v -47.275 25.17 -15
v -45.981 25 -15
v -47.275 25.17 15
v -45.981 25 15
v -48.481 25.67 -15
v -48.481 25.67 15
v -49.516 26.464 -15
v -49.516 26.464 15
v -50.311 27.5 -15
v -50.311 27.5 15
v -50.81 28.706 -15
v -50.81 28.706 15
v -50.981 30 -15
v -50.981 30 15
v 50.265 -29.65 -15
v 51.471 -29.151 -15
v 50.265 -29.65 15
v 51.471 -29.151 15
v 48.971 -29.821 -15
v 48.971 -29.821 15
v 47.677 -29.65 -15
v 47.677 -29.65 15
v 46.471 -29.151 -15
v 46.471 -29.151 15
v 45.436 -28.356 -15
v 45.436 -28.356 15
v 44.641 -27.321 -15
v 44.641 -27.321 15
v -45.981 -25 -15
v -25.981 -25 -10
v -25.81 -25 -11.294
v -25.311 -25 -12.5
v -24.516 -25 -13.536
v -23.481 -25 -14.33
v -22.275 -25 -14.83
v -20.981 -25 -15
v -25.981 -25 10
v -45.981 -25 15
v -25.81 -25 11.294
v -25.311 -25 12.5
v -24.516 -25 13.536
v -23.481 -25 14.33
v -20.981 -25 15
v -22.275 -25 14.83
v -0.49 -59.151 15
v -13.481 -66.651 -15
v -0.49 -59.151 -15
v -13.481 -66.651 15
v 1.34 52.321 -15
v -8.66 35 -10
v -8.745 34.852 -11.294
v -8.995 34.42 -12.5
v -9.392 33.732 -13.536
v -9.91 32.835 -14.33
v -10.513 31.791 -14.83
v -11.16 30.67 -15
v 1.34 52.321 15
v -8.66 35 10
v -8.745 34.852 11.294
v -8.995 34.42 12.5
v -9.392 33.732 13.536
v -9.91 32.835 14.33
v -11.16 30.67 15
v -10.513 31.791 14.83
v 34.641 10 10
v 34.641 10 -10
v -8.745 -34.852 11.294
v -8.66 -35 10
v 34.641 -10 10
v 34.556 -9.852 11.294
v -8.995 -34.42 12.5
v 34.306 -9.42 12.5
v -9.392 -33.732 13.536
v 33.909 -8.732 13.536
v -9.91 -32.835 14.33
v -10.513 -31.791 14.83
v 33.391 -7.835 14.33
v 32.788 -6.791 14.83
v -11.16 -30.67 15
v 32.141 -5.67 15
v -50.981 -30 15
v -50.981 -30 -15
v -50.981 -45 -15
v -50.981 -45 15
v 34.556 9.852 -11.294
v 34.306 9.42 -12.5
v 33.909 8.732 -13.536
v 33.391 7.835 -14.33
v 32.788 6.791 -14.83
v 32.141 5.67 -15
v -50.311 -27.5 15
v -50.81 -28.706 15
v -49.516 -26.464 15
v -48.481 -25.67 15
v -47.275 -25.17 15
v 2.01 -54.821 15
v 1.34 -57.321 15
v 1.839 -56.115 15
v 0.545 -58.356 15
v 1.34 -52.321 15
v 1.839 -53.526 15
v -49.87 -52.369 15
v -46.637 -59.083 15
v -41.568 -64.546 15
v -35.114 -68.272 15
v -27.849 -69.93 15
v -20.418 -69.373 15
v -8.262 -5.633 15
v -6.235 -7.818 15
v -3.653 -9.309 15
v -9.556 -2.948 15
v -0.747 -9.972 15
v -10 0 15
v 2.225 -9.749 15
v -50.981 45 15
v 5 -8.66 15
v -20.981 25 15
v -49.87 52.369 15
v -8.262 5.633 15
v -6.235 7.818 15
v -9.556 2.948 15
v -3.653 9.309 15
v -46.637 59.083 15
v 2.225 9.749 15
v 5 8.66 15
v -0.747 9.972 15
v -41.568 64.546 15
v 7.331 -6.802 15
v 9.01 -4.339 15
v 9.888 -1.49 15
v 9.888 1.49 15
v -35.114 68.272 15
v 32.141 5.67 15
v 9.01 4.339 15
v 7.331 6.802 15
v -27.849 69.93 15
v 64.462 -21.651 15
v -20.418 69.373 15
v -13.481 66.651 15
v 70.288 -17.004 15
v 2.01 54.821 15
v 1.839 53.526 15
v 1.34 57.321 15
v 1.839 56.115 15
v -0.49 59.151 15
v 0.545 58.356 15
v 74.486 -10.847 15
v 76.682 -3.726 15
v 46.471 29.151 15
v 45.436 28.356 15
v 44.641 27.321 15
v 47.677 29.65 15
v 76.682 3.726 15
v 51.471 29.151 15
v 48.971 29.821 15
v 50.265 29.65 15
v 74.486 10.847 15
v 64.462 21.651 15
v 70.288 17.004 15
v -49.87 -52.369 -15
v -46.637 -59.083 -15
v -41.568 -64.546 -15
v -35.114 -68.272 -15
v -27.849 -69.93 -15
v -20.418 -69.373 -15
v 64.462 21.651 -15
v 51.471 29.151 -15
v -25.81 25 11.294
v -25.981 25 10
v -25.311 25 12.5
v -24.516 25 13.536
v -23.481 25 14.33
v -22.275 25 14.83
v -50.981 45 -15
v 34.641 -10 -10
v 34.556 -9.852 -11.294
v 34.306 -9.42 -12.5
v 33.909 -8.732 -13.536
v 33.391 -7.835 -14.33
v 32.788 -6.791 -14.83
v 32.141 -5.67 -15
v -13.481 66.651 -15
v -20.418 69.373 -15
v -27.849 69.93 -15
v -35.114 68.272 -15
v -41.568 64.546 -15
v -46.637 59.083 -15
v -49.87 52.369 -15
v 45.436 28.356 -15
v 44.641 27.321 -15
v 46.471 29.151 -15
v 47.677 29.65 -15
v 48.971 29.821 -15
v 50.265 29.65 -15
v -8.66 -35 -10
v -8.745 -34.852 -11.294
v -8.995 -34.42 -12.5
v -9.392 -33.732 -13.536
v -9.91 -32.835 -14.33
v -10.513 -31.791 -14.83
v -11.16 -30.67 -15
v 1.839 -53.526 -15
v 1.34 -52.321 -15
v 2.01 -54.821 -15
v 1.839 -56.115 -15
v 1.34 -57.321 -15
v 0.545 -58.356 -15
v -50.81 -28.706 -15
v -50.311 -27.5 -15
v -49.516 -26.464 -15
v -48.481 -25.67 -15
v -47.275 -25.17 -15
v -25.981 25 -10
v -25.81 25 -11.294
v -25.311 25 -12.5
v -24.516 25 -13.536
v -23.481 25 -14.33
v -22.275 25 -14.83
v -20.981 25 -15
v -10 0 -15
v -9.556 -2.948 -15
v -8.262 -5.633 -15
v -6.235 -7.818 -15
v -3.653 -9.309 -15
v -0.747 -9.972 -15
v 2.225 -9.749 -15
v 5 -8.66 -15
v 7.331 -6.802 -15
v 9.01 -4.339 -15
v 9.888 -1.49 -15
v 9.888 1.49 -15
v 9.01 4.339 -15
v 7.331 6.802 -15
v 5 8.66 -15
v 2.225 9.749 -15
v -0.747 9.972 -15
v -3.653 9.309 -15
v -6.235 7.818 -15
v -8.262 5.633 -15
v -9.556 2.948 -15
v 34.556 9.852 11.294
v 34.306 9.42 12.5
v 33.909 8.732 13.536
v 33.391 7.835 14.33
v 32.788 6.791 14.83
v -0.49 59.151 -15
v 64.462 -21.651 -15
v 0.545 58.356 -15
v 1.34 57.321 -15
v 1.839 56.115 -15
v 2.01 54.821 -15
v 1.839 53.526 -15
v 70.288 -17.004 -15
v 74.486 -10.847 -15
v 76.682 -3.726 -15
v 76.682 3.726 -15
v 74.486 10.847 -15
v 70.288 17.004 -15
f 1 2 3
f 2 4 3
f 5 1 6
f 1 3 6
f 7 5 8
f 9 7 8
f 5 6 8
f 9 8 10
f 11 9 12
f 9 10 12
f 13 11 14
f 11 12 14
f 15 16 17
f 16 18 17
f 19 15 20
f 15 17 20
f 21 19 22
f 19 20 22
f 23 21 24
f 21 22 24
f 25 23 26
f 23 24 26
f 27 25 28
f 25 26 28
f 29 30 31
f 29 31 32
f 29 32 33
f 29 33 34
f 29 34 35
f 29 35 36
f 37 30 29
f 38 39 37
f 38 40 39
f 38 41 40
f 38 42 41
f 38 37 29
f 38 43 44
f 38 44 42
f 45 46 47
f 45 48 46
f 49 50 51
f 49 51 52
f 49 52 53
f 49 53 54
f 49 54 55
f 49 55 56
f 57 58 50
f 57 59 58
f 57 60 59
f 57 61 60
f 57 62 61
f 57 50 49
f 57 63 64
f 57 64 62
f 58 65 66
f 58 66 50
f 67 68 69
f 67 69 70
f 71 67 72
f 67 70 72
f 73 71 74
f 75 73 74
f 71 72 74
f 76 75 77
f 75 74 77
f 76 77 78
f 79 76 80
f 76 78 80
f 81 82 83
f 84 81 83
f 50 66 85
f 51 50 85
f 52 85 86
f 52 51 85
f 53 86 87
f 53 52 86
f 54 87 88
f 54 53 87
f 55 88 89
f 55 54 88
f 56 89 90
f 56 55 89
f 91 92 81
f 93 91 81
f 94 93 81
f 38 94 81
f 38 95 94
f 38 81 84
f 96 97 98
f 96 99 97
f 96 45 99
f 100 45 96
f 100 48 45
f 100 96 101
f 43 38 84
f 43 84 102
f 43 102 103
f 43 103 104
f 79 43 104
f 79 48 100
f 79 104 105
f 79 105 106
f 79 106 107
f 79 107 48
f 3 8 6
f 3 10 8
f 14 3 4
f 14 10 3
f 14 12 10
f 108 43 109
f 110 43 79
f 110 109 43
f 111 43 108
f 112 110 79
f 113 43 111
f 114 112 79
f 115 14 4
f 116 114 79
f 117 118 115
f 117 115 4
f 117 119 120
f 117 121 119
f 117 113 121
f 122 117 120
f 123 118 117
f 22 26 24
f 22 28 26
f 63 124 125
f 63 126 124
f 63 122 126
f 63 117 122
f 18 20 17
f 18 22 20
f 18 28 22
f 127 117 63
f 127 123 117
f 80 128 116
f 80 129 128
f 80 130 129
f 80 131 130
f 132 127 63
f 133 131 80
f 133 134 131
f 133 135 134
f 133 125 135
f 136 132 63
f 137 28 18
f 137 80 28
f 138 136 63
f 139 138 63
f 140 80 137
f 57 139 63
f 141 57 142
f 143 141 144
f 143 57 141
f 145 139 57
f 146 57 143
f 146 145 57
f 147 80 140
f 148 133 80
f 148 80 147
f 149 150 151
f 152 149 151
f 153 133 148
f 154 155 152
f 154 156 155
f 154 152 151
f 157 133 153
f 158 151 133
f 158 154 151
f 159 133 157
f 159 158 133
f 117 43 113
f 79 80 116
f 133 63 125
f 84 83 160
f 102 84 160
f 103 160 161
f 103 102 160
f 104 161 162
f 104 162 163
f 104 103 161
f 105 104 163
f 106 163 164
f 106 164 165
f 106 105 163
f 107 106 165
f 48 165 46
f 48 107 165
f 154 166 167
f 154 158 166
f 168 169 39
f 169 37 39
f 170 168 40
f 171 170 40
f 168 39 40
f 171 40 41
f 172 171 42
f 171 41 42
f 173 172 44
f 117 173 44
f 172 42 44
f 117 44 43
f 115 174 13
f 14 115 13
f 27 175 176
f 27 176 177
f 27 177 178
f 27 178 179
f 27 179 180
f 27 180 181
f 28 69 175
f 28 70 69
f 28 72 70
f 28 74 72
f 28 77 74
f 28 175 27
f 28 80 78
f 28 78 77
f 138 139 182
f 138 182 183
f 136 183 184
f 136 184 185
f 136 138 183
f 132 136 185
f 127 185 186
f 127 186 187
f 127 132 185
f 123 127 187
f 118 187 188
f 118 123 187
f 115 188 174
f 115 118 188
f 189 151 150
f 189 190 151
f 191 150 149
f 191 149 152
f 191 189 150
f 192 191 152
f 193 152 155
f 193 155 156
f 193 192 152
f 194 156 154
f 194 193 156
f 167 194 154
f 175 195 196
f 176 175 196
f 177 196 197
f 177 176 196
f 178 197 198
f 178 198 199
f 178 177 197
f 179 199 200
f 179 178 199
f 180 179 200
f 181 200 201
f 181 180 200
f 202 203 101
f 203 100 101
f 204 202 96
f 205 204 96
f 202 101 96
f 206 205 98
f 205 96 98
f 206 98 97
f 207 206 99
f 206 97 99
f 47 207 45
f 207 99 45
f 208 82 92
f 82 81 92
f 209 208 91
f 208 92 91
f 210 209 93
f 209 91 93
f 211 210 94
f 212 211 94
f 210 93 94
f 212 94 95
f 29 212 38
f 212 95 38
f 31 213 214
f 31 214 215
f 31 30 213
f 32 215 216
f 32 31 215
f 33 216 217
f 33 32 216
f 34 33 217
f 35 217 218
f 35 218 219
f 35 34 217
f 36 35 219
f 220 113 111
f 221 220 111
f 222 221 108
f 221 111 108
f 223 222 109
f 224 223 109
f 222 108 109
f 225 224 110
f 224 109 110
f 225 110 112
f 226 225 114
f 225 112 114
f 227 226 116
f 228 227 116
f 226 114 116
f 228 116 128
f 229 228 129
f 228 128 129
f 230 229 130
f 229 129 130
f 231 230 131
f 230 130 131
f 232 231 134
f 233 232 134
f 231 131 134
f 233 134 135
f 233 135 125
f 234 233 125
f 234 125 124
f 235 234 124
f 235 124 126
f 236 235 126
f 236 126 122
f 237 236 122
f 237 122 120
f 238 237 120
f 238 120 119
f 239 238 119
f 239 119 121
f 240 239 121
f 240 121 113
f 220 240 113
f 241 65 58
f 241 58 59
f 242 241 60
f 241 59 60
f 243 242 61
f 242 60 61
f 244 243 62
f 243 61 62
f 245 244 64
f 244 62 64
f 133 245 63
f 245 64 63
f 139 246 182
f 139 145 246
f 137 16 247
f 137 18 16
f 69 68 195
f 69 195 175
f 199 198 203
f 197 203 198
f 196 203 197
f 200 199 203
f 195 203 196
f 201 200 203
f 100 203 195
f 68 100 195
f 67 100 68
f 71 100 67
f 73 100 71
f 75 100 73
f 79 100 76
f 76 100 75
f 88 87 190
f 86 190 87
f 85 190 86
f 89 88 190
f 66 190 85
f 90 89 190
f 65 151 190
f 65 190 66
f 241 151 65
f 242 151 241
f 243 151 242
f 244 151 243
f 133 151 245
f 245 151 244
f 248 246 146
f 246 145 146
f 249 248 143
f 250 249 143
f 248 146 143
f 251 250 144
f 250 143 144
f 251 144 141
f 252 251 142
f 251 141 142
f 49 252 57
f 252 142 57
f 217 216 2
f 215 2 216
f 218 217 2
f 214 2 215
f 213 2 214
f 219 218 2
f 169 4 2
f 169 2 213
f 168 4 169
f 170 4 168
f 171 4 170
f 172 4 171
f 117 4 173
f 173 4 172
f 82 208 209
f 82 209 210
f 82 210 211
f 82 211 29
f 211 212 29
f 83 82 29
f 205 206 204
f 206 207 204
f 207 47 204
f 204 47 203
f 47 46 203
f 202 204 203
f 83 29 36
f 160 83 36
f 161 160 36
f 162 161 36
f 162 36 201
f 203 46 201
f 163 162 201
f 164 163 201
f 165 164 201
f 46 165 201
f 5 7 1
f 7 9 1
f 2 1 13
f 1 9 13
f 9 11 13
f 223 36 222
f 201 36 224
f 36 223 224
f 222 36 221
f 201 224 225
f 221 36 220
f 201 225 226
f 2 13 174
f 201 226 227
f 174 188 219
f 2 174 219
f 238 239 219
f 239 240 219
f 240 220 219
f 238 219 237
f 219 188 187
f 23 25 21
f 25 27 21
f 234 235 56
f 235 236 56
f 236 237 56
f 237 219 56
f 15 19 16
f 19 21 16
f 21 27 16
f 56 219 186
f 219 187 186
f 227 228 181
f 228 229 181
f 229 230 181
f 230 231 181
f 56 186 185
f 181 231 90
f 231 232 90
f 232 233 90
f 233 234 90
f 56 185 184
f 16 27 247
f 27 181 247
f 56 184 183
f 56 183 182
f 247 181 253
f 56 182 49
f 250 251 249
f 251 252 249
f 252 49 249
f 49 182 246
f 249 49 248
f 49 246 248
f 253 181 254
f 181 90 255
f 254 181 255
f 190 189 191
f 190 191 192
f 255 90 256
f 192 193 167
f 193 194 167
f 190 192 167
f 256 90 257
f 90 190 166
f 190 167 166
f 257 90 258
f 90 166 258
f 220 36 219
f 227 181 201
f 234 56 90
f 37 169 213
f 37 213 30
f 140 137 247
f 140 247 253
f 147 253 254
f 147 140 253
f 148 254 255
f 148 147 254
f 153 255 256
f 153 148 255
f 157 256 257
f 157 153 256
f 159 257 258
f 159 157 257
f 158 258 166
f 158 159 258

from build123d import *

# Parameters (mm, degrees)
F1_DEPTH = 15
F2_R     = 5
F3_D     = 20
F4_D     = 20


with BuildPart() as f1:
    # F0 (on Top) → F1 (new body, symmetric)
    with BuildSketch(Plane.XY):
        with BuildLine():
            Line((34.641016, 10), (-8.660254, 35))
            Line((-8.660254, 35), (3.839746, 56.650635))
            Line((3.839746, 56.650635), (-13.480762, 66.650635))
            ThreePointArc((-13.480762, 66.650635), (-38.480762, 66.650635), (-50.980762, 45))
            Line((-50.980762, 45), (-50.980762, 25))
            Line((-50.980762, 25), (-25.980762, 25))
            Line((-25.980762, 25), (-25.980762, -25))
            Line((-25.980762, -25), (-50.980762, -25))
            Line((-50.980762, -25), (-50.980762, -45))
            ThreePointArc((-50.980762, -45), (-38.480762, -66.650635), (-13.480762, -66.650635))
            Line((-13.480762, -66.650635), (3.839746, -56.650635))
            Line((3.839746, -56.650635), (-8.660254, -35))
            Line((-8.660254, -35), (34.641016, -10))
            Line((34.641016, -10), (47.141016, -31.650635))
            Line((47.141016, -31.650635), (64.461524, -21.650635))
            ThreePointArc((64.461524, -21.650635), (76.961524, 0), (64.461524, 21.650635))
            Line((64.461524, 21.650635), (47.141016, 31.650635))
            Line((47.141016, 31.650635), (34.641016, 10))
        make_face()
    extrude(amount=F1_DEPTH, both=True)

    # F2
    f2_edges = [f1.edges().sort_by_distance(p)[0] for p in [
        (12.990381, 22.5, 15),
        (12.990381, -22.5, 15),
        (-25.980762, 0, 15),
        (12.990381, 22.5, -15),
        (12.990381, -22.5, -15),
        (-25.980762, 0, -15),
        (3.839746, 56.650635, 0),
        (3.839746, -56.650635, 0),
        (47.141016, -31.650635, 0),
        (47.141016, 31.650635, 0),
        (-50.980762, -25, 0),
        (-50.980762, 25, 0),
    ]]
    fillet(f2_edges, radius=F2_R)

    # F3 (through all)
    with Locations(Plane(origin=(0, 0, 0), x_dir=(1, 0, 0), z_dir=(0, 0, -1))):
        with Locations((0, 0)):
            Hole(F3_D / 2)

    # F4 (through all)
    with Locations(Plane.XY):
        with Locations((0, 0)):
            Hole(F4_D / 2)


solid = f1.part
